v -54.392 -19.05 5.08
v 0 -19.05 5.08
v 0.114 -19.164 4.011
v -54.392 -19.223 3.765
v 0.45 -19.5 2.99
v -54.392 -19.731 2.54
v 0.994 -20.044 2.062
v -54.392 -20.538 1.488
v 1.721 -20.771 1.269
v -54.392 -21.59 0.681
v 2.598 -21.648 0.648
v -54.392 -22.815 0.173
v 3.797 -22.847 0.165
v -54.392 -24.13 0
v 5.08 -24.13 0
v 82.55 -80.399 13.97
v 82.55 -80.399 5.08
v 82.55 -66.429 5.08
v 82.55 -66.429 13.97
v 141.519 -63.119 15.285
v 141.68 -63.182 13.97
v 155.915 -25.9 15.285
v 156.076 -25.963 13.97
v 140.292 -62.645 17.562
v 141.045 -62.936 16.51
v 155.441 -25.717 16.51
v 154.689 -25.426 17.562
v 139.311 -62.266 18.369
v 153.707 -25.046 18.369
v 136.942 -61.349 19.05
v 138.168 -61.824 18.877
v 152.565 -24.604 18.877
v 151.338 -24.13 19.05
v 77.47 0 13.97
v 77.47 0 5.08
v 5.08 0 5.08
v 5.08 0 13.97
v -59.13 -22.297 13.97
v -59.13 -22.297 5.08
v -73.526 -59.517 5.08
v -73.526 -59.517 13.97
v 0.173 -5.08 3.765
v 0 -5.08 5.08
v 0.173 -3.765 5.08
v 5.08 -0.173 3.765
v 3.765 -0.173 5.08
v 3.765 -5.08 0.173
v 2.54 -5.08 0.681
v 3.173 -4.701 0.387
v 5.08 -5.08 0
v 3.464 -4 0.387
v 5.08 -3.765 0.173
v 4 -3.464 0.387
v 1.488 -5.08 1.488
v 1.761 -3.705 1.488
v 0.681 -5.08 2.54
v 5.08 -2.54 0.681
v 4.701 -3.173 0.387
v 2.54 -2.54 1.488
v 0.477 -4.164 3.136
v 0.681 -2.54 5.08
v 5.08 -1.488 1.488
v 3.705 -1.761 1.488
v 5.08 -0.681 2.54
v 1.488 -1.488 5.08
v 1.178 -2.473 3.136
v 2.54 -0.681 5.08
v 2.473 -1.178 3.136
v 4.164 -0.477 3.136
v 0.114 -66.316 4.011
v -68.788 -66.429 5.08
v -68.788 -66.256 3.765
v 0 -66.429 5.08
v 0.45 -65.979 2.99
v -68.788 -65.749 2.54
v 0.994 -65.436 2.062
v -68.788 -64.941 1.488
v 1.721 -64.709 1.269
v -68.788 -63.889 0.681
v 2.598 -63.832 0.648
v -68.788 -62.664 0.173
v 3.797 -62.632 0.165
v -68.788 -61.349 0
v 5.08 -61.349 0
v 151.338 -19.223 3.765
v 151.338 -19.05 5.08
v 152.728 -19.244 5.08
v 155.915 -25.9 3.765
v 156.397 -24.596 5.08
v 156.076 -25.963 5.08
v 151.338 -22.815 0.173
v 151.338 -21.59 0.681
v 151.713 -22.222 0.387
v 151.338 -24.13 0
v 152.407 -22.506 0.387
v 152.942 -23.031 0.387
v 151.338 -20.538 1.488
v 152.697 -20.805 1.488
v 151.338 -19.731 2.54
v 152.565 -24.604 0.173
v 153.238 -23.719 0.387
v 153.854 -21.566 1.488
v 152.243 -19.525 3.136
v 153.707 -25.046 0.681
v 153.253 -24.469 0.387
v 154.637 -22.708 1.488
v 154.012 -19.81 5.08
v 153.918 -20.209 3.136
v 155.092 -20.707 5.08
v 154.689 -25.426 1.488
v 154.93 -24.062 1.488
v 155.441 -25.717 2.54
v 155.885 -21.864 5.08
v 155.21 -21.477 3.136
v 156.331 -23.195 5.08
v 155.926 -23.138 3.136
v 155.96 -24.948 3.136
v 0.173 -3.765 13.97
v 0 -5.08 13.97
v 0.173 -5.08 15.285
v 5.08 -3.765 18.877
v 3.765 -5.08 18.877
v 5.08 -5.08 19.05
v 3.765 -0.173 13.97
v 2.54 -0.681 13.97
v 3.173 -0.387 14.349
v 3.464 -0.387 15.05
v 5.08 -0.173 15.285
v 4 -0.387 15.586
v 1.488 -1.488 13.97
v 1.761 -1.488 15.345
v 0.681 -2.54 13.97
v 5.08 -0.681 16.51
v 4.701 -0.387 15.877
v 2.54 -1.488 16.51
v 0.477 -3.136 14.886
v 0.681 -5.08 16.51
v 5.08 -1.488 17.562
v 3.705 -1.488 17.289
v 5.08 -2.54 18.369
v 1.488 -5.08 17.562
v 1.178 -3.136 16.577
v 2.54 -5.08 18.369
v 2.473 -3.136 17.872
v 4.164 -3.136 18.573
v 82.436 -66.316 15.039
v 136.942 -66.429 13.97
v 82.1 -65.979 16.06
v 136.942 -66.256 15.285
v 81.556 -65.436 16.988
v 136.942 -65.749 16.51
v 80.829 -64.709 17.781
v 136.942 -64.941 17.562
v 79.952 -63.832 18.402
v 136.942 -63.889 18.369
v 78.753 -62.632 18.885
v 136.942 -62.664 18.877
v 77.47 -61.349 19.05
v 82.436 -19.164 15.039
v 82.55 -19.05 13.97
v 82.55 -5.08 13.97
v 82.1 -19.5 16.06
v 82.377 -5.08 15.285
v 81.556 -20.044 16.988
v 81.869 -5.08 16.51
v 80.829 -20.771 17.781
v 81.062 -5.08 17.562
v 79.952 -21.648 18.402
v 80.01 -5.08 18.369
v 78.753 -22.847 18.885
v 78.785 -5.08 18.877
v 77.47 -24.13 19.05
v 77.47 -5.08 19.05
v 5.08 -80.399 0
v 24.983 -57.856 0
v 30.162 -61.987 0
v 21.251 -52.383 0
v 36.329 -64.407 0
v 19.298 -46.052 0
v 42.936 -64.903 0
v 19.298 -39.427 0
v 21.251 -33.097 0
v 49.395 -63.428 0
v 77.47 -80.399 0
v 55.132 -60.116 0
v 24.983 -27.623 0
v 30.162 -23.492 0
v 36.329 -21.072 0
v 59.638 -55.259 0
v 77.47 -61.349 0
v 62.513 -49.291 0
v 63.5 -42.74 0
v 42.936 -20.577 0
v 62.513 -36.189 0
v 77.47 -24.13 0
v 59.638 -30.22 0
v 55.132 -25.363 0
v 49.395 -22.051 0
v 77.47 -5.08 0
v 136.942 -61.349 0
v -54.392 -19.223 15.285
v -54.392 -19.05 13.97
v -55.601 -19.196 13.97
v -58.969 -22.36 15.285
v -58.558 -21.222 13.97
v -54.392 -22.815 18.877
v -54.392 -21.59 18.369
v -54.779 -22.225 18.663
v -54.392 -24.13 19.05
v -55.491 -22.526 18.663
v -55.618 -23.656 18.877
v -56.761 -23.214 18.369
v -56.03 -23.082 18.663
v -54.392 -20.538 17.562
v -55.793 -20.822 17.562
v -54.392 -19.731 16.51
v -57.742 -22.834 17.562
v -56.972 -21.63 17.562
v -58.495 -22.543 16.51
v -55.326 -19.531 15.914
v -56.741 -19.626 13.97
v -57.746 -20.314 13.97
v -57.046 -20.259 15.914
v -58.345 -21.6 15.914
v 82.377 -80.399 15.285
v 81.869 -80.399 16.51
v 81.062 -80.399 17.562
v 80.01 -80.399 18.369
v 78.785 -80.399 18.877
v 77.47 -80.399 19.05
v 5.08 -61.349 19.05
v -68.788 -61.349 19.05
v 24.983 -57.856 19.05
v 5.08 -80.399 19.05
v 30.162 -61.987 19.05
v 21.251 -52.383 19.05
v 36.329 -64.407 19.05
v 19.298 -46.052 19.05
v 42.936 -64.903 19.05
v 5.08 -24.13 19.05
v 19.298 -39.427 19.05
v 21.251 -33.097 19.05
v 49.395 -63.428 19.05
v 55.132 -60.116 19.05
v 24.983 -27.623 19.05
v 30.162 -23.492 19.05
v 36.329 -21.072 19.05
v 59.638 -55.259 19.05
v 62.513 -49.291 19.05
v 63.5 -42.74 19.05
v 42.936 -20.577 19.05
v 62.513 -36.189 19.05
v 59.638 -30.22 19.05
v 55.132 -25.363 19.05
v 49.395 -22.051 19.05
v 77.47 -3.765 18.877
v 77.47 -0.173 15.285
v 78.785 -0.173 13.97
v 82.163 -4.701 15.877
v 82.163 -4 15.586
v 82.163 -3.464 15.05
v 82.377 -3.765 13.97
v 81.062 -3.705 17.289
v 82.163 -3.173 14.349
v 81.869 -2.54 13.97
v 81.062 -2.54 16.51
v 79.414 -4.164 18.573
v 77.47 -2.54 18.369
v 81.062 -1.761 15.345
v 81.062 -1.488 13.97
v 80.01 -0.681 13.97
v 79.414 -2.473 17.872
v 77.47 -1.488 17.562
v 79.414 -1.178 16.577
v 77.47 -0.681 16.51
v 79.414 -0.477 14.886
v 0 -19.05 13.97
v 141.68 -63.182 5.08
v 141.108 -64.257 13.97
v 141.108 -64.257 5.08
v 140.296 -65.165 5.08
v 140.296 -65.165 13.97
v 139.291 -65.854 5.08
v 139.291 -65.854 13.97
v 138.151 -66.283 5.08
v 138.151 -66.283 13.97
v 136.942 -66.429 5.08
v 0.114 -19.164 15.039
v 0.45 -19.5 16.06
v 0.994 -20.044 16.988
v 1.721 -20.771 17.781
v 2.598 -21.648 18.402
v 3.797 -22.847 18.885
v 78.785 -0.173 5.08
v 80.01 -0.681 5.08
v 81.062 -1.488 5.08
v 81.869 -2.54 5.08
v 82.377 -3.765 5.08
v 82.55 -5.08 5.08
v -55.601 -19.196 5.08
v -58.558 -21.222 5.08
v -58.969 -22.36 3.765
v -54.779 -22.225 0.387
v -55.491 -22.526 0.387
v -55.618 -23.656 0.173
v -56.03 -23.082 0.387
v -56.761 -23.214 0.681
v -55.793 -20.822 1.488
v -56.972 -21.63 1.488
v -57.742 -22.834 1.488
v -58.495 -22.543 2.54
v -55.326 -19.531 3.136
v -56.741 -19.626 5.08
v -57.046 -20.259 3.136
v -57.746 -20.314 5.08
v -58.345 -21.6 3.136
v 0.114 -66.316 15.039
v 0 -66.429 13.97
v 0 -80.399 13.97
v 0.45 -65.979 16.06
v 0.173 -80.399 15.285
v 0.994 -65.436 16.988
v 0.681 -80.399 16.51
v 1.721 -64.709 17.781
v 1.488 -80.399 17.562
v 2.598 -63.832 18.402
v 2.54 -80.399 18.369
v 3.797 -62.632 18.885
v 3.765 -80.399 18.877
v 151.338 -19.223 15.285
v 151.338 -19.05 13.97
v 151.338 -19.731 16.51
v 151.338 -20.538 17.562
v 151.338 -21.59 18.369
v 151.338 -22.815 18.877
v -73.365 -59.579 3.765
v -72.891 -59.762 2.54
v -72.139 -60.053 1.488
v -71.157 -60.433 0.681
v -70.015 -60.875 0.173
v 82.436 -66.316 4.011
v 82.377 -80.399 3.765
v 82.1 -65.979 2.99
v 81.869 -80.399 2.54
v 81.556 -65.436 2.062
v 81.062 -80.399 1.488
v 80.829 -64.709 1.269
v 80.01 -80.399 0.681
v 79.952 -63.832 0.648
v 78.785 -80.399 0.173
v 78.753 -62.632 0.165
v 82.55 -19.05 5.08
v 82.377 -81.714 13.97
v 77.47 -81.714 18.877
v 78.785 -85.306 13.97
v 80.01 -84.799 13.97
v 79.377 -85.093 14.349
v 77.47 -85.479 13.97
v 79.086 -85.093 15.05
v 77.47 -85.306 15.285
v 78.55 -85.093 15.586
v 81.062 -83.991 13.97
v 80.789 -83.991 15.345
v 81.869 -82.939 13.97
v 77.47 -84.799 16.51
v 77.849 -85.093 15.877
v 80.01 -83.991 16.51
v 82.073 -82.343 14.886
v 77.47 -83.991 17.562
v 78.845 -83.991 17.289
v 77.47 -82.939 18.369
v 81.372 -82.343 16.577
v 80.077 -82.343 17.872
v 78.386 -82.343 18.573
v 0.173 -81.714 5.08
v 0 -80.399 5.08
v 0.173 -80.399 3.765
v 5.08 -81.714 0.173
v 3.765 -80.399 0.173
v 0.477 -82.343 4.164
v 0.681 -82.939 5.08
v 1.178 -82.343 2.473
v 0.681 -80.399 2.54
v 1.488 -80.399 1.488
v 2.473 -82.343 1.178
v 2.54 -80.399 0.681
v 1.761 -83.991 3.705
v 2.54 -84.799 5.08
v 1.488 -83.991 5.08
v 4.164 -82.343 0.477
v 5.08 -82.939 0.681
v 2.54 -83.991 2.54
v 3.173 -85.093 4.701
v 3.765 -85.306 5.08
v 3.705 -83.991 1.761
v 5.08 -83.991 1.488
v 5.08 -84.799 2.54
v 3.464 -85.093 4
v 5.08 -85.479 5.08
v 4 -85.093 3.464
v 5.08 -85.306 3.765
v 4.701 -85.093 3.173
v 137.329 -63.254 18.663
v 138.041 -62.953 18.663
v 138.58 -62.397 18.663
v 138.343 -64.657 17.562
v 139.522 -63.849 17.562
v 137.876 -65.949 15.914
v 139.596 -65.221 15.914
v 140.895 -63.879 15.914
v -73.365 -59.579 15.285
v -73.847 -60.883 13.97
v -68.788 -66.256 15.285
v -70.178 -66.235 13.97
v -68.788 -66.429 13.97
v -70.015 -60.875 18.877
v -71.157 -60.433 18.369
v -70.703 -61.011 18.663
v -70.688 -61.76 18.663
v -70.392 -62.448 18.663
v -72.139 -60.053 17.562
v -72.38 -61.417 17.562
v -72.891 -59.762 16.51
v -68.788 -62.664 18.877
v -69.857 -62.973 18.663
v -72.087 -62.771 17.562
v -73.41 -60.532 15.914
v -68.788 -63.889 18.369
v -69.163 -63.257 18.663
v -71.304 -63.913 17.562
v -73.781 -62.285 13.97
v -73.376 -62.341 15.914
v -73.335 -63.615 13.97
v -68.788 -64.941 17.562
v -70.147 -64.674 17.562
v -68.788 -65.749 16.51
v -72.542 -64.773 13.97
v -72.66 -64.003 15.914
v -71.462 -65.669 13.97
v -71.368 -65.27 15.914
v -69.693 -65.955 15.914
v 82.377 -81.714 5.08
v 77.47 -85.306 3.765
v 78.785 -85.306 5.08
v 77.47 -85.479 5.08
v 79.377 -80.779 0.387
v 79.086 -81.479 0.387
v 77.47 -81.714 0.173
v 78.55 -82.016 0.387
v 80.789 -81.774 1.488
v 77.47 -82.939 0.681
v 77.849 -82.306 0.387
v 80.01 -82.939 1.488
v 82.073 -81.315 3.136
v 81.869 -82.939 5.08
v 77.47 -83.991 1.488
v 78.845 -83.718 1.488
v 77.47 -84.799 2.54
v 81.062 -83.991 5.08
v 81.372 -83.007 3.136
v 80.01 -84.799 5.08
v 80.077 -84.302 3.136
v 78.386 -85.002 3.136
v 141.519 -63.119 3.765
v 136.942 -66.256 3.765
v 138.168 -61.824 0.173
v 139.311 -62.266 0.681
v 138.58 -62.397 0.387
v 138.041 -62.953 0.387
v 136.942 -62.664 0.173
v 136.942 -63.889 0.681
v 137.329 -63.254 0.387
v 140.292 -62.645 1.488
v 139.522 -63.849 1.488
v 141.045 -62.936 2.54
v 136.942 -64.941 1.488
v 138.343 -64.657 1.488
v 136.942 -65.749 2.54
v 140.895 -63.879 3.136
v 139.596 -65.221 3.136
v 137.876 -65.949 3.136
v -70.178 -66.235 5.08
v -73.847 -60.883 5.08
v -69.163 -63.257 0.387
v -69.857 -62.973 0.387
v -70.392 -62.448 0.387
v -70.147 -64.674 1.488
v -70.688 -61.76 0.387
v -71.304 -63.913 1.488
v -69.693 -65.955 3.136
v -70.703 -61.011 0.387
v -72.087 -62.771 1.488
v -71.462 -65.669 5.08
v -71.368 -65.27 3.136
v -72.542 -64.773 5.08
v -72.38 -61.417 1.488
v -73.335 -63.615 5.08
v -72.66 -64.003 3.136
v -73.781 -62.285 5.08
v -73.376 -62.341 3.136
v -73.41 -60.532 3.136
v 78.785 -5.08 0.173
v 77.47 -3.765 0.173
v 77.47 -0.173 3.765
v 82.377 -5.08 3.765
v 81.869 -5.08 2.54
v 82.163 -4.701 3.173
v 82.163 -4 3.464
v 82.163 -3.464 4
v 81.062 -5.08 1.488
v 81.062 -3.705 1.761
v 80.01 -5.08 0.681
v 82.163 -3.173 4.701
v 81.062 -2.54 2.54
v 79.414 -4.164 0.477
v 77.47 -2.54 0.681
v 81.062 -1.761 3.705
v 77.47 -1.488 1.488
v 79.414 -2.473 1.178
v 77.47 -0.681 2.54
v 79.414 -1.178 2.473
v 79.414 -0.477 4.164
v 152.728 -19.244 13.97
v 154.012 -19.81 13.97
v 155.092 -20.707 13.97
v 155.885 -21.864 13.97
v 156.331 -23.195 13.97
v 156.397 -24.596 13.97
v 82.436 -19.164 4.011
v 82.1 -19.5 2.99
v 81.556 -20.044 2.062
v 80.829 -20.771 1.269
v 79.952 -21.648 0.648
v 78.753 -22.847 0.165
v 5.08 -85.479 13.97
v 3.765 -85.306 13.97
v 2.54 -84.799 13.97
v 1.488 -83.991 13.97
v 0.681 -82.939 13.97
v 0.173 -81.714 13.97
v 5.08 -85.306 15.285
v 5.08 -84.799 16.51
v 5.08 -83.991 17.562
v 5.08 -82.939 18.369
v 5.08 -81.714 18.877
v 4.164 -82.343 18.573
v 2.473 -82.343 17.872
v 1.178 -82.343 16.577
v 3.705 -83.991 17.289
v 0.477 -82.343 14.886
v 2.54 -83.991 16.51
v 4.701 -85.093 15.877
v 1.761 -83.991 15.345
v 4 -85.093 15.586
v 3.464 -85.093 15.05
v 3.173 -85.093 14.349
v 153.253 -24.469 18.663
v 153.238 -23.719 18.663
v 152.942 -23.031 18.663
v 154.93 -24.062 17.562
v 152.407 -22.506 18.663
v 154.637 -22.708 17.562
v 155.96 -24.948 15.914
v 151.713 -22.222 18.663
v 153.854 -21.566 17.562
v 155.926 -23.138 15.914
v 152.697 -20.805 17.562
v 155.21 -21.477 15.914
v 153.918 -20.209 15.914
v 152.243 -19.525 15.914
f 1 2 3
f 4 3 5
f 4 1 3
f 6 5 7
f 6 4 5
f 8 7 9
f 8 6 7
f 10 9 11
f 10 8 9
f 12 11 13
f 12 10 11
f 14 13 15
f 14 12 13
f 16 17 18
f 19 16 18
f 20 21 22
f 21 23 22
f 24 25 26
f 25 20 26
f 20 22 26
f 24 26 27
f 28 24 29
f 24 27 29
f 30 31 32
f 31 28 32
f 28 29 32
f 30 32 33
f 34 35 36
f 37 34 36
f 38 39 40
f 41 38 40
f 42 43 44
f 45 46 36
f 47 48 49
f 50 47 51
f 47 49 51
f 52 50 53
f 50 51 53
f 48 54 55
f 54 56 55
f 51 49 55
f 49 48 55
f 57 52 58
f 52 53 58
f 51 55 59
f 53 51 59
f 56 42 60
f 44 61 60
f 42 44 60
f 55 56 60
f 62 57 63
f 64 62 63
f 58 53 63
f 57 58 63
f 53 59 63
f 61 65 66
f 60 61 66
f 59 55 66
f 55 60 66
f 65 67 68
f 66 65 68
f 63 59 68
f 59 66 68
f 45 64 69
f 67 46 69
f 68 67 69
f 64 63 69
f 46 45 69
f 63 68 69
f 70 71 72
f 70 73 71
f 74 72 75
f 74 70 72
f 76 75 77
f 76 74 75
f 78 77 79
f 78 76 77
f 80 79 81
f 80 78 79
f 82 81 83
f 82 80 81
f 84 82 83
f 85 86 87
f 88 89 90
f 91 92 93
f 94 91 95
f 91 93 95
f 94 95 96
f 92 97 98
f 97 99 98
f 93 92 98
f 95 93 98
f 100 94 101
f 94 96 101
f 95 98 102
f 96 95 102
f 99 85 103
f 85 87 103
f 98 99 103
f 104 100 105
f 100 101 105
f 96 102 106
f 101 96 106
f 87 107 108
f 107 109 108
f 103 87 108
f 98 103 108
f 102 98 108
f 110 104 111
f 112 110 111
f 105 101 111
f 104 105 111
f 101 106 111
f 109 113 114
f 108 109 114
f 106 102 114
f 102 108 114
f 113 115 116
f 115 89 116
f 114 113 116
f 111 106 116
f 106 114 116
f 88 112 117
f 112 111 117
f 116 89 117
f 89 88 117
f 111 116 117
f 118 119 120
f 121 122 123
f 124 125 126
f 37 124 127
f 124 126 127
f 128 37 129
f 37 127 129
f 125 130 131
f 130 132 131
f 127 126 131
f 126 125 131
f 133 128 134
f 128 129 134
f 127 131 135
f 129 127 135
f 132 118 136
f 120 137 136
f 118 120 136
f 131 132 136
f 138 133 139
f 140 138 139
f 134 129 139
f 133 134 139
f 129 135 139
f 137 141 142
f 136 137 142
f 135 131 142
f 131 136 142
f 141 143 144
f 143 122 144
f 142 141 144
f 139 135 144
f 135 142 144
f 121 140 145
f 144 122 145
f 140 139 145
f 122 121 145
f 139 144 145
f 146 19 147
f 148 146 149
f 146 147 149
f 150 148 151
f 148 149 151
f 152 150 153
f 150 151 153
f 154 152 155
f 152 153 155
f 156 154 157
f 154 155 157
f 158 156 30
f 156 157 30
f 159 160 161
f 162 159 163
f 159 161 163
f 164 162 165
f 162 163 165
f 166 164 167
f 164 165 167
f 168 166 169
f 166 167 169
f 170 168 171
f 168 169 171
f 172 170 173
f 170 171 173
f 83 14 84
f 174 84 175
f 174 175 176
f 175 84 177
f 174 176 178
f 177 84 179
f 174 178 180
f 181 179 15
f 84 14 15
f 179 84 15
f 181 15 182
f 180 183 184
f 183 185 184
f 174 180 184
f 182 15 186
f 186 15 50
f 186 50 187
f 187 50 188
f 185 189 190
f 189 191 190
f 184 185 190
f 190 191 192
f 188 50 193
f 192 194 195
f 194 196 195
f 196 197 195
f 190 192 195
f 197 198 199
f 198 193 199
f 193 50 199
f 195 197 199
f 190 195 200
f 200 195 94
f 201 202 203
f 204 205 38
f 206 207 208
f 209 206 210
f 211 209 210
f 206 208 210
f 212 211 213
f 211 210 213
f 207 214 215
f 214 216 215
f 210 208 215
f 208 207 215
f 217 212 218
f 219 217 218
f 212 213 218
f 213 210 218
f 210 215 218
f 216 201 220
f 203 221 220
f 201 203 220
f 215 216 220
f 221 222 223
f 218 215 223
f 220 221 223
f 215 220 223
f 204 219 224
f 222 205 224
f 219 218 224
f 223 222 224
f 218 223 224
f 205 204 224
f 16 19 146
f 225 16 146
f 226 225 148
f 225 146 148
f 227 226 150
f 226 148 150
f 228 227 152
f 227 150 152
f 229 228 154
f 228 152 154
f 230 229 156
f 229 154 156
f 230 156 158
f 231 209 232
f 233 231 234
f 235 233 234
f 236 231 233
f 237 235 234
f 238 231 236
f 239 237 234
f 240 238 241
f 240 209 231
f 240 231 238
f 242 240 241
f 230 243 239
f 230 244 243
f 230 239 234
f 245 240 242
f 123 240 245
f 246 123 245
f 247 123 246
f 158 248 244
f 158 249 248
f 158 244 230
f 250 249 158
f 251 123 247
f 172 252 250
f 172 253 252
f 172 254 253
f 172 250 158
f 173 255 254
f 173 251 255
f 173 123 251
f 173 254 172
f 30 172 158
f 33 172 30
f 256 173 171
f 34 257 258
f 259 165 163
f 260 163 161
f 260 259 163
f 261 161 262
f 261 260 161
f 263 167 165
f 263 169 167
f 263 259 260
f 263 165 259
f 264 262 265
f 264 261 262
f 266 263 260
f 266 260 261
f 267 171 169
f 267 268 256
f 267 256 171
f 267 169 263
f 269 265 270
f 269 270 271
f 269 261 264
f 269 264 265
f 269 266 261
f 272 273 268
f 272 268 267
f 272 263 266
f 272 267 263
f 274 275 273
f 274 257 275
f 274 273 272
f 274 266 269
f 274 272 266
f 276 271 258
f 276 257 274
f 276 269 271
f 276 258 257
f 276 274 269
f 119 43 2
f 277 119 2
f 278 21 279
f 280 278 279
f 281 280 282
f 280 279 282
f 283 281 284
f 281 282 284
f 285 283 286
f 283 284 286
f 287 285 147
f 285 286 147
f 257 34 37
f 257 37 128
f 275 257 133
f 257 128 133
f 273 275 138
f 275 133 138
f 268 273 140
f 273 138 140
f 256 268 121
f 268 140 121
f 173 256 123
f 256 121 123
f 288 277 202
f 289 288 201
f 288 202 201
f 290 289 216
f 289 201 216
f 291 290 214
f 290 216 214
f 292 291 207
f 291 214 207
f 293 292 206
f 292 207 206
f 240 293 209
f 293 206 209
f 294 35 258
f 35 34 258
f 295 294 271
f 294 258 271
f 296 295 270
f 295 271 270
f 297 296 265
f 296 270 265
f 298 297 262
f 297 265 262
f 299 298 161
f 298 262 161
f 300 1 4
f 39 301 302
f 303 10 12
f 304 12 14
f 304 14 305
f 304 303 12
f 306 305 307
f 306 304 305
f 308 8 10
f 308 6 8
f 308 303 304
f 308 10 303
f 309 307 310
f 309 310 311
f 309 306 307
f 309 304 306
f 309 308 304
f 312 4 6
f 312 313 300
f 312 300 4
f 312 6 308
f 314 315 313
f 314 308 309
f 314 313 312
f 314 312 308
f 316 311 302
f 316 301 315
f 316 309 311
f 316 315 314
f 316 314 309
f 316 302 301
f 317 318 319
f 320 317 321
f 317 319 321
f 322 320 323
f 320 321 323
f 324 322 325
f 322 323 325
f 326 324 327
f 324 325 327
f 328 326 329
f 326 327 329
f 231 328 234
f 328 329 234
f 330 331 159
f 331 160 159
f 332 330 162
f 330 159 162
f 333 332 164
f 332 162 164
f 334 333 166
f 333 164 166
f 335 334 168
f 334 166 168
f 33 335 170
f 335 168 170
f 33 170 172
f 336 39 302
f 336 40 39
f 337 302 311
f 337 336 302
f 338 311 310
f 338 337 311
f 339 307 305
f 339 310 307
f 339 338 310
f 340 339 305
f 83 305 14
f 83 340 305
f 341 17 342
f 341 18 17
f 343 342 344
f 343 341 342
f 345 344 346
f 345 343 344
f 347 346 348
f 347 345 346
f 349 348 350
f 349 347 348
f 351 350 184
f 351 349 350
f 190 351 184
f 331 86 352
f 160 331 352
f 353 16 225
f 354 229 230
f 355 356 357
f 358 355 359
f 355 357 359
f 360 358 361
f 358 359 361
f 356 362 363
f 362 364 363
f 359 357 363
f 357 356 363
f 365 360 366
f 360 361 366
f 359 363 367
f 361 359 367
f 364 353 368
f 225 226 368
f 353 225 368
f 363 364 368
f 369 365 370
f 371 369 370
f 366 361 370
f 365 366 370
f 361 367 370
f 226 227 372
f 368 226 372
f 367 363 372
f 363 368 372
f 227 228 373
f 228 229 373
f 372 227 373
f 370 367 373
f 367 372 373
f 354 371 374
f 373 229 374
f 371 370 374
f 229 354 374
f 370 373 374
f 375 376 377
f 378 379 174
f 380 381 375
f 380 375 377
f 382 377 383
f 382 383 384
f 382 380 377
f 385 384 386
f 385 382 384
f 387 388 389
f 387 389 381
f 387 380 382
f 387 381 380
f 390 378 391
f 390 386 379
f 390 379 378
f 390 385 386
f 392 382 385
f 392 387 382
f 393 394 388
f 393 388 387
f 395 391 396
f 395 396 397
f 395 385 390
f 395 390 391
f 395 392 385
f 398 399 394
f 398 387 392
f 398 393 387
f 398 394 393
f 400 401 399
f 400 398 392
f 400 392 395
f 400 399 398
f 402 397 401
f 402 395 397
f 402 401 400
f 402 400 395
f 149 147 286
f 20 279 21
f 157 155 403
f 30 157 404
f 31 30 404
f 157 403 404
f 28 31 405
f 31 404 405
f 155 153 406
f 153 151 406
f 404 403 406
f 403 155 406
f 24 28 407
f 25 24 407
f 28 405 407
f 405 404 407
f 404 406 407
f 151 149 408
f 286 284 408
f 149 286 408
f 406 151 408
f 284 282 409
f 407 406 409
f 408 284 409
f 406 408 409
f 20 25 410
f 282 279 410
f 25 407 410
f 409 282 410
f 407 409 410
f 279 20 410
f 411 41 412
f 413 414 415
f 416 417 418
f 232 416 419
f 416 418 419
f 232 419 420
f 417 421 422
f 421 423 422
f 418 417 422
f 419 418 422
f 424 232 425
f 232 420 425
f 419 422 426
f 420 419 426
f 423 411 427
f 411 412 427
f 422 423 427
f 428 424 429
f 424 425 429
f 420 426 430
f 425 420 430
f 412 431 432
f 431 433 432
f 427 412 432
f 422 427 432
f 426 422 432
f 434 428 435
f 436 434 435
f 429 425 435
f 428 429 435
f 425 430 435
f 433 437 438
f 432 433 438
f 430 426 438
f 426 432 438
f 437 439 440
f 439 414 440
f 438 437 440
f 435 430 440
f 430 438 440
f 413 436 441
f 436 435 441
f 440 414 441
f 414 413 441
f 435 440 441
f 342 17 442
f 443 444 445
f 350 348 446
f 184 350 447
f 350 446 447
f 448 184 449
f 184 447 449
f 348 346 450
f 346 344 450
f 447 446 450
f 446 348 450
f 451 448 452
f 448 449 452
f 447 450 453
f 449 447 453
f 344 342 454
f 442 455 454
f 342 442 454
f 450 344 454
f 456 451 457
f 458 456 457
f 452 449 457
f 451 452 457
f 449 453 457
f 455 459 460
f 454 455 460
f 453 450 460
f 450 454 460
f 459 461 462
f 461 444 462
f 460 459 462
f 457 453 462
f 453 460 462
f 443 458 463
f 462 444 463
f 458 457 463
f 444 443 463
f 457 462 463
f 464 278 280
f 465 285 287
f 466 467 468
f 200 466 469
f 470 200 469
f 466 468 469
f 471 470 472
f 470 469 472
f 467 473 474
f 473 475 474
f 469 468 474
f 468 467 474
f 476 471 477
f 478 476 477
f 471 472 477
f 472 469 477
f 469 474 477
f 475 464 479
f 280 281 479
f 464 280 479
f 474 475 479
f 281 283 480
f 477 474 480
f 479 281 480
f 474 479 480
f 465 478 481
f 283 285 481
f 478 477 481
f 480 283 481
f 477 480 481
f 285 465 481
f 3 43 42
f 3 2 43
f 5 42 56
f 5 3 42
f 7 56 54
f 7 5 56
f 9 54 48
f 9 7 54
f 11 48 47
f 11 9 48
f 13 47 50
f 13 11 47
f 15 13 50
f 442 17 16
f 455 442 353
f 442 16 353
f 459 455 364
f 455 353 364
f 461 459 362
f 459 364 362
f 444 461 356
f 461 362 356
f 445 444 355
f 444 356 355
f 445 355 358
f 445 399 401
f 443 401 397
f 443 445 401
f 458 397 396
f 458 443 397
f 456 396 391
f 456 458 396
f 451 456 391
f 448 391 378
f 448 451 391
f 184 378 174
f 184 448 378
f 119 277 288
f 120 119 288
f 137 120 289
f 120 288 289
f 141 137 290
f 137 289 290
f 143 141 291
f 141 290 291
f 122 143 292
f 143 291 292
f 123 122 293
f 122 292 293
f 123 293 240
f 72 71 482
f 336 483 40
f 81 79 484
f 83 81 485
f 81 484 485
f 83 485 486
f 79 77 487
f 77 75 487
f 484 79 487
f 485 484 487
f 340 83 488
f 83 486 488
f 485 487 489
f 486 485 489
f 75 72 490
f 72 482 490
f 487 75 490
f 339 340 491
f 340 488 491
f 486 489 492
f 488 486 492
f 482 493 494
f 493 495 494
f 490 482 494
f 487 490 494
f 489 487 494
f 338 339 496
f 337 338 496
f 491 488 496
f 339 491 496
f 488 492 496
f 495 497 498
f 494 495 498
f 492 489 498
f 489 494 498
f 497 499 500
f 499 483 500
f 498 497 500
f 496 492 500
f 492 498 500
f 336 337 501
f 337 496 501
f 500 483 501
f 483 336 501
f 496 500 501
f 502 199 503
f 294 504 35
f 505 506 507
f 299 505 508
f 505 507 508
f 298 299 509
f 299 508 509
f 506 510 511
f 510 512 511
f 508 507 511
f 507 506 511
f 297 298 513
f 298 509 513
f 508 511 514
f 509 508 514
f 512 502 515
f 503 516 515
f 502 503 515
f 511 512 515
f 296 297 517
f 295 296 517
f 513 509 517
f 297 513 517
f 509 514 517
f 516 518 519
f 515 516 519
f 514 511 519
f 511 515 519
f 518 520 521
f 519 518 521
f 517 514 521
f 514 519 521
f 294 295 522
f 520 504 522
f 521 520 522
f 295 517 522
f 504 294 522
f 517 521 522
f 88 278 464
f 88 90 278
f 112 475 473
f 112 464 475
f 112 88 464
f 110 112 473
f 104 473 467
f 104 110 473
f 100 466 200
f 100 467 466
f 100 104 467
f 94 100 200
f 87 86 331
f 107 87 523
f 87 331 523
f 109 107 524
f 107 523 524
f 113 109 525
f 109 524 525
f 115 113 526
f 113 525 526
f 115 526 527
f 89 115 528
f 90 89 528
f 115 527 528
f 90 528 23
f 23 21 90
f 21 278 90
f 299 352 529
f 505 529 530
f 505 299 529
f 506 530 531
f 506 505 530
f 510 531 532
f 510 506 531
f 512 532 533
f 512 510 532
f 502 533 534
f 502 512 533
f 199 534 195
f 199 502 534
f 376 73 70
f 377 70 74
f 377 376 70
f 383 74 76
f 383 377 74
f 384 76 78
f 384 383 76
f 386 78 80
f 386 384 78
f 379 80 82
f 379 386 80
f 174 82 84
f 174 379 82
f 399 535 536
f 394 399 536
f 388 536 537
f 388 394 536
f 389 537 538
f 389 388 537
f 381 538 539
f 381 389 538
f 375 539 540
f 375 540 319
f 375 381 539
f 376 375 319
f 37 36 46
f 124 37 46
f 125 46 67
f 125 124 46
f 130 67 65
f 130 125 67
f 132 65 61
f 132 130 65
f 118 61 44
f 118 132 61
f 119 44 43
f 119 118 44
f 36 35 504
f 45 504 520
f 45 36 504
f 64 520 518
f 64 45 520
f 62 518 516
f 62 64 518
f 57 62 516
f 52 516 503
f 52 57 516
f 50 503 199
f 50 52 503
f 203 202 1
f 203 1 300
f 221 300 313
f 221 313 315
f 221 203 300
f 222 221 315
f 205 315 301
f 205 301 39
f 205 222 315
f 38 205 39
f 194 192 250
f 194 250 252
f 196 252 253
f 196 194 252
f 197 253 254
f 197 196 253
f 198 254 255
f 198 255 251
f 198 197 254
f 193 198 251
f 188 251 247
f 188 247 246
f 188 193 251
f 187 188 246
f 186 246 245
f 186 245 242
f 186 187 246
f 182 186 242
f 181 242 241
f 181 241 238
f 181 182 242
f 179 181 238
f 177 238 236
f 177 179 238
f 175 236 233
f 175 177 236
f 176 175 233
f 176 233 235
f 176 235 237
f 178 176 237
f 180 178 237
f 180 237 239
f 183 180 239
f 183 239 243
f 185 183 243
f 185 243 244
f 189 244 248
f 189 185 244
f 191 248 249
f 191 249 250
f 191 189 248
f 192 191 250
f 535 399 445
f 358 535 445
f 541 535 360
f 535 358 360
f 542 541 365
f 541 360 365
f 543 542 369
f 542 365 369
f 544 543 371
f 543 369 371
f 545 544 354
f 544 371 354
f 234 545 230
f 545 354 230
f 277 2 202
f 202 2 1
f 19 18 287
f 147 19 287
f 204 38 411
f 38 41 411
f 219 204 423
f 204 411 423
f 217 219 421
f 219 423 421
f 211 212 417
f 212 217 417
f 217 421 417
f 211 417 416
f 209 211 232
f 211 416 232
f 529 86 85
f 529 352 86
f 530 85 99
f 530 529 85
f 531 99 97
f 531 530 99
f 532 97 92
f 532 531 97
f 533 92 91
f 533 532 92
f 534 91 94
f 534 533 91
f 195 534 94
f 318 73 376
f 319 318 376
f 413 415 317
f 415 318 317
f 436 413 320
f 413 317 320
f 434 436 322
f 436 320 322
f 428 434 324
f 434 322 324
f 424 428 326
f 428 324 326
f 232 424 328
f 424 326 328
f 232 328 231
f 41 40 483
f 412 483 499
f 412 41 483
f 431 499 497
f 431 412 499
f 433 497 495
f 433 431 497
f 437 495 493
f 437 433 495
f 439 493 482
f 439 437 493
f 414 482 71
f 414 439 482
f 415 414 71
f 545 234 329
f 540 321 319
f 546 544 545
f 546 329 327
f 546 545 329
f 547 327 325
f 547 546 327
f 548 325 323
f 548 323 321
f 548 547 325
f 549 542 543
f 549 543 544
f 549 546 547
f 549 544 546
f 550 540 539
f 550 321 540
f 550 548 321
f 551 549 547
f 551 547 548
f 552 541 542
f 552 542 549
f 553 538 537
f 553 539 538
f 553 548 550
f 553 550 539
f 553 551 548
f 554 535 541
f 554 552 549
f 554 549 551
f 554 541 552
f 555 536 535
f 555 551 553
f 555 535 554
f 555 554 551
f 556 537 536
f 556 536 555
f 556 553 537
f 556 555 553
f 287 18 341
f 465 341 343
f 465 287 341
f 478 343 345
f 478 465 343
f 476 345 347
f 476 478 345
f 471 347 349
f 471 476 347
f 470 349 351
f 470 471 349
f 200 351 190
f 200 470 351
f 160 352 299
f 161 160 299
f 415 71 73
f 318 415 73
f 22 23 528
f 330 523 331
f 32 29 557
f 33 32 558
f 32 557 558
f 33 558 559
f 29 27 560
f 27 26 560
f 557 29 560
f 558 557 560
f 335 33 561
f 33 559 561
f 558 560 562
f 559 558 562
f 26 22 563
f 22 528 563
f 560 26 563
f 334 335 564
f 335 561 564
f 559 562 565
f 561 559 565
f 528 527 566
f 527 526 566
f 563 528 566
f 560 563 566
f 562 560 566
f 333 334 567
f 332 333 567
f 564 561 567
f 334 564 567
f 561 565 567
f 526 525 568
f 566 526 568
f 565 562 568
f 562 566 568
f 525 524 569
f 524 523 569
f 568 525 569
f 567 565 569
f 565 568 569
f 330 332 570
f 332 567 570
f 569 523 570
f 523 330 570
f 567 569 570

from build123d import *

# Parameters (mm, degrees)
F0_R         = 22.225
F1_DEPTH     = 19.05
F2_R         = 5.08
F3_T1_DEPTH  = 8.89
F3_S5_W      = 5.08
F3_S5_H      = 5.08
F3_T6_DEPTH  = 5.08
F3_S11_W     = 5.08
F3_S11_H     = 5.08
F3_T12_DEPTH = 5.08


# Not quite as in the source:
# - a fillet or chamfer that OpenCascade refuses, or shapes differently, is made with other operations: its cross-section is extruded or revolved along the edge and cut away or added


with BuildPart() as f1:
    # F0 (on Top) → F1 (new body)
    with BuildSketch(Plane.XY):
        Polygon((82.55, 0), (0, 0), (0, -19.05), (-57.8740507578, -19.05), (-76.2, -66.4293159973), (0, -66.4293159973), (0, -85.4793159973), (82.55, -85.4793159973), (82.55, -66.4293159973), (140.4240507578, -66.4293159973), (158.75, -19.05), (82.55, -19.05), align=None)
        with Locations((41.275, -42.7396579986)):
            Circle(F0_R, mode=Mode.SUBTRACT)
    extrude(amount=F1_DEPTH)

    # F2
    f2_edges = [f1.edges().sort_by_distance(p)[0] for p in [
        (111.487025, -66.429316, 19.05),
        (149.587025, -42.739658, 19.05),
        (120.65, -19.05, 19.05),
        (149.587025, -42.739658, 0),
        (111.487025, -66.429316, 0),
        (158.75, -19.05, 9.525),
        (140.424051, -66.429316, 9.525),
        (82.55, -75.954316, 19.05),
        (82.55, -85.479316, 9.525),
        (82.55, -75.954316, 0),
        (41.275, -85.479316, 0),
        (41.275, -85.479316, 19.05),
        (0, -75.954316, 19.05),
        (0, -75.954316, 0),
        (-38.1, -66.429316, 19.05),
        (-76.2, -66.429316, 9.525),
        (-38.1, -66.429316, 0),
        (-67.037025, -42.739658, 19.05),
        (-67.037025, -42.739658, 0),
        (-57.874051, -19.05, 9.525),
        (-28.937025, -19.05, 0),
        (-28.937025, -19.05, 19.05),
        (0, -9.525, 19.05),
        (0, 0, 9.525),
        (0, -9.525, 0),
        (41.275, 0, 19.05),
        (41.275, 0, 0),
        (82.55, -9.525, 19.05),
        (82.55, -9.525, 0),
        (120.65, -19.05, 0),
        (82.55, 0, 9.525),
    ]]
    fillet(f2_edges, radius=F2_R)

    # F3: fillet of radius 5.08 on 1 edges, made by hand

    # F3_s2 → F3_t1 (cut)
    with BuildSketch(Plane.XY.offset(5.08)):
        with BuildLine():
            ThreePointArc((5.08, -85.4793159973), (1.4878975516, -83.9914184457), (0, -80.3993159973))
            Line((0, -80.3993159973), (0, -85.4793159973))
            Line((0, -85.4793159973), (5.08, -85.4793159973))
        make_face()
    extrude(amount=F3_T1_DEPTH, mode=Mode.SUBTRACT)


with BuildPart() as f3_tool4:
    # F3_s5 → F3_t6 (new body)
    with BuildSketch(Plane.XZ.offset(80.3993159973)):
        with Locations((2.54, 2.54)):
            Rectangle(F3_S5_W, F3_S5_H)
    extrude(amount=F3_T6_DEPTH)

    # F3_s7 → F3_t8 (revolve, cut)
    with BuildSketch(Plane(origin=(5.08, -80.3993159973, 5.08), x_dir=(0.7071067812, 0, 0.7071067812), z_dir=(0.7071067812, 0, -0.7071067812))):
        with BuildLine():
            ThreePointArc((0, -5.08), (5.08, 0), (0, 5.08))
            Line((0, 5.08), (0, -5.08))
        make_face()
    revolve(axis=Axis((5.08, -80.3993159973, 5.08), (0, -1, 0)), mode=Mode.SUBTRACT)


with BuildPart() as f1_1:
    add(f1.part)

    # F3_t3: cut F3_tool4
    add(f3_tool4.part, mode=Mode.SUBTRACT)


with BuildPart() as f3_tool10:
    # F3_s11 → F3_t12 (new body)
    with BuildSketch(Plane.XZ.offset(80.3993159973)):
        with Locations((2.54, 16.51)):
            Rectangle(F3_S11_W, F3_S11_H)
    extrude(amount=F3_T12_DEPTH)

    # F3_s13 → F3_t14 (revolve, cut)
    with BuildSketch(Plane(origin=(5.08, -80.3993159973, 13.97), x_dir=(0.7071067812, 0, -0.7071067812), z_dir=(-0.7071067812, 0, -0.7071067812))):
        with BuildLine():
            ThreePointArc((0, -5.08), (5.08, 0), (0, 5.08))
            Line((0, 5.08), (0, -5.08))
        make_face()
    revolve(axis=Axis((5.08, -80.3993159973, 13.97), (0, -1, 0)), mode=Mode.SUBTRACT)


with BuildPart() as f1_2:
    add(f1_1.part)

    # F3_t9: cut F3_tool10
    add(f3_tool10.part, mode=Mode.SUBTRACT)


solid = f1_2.part
